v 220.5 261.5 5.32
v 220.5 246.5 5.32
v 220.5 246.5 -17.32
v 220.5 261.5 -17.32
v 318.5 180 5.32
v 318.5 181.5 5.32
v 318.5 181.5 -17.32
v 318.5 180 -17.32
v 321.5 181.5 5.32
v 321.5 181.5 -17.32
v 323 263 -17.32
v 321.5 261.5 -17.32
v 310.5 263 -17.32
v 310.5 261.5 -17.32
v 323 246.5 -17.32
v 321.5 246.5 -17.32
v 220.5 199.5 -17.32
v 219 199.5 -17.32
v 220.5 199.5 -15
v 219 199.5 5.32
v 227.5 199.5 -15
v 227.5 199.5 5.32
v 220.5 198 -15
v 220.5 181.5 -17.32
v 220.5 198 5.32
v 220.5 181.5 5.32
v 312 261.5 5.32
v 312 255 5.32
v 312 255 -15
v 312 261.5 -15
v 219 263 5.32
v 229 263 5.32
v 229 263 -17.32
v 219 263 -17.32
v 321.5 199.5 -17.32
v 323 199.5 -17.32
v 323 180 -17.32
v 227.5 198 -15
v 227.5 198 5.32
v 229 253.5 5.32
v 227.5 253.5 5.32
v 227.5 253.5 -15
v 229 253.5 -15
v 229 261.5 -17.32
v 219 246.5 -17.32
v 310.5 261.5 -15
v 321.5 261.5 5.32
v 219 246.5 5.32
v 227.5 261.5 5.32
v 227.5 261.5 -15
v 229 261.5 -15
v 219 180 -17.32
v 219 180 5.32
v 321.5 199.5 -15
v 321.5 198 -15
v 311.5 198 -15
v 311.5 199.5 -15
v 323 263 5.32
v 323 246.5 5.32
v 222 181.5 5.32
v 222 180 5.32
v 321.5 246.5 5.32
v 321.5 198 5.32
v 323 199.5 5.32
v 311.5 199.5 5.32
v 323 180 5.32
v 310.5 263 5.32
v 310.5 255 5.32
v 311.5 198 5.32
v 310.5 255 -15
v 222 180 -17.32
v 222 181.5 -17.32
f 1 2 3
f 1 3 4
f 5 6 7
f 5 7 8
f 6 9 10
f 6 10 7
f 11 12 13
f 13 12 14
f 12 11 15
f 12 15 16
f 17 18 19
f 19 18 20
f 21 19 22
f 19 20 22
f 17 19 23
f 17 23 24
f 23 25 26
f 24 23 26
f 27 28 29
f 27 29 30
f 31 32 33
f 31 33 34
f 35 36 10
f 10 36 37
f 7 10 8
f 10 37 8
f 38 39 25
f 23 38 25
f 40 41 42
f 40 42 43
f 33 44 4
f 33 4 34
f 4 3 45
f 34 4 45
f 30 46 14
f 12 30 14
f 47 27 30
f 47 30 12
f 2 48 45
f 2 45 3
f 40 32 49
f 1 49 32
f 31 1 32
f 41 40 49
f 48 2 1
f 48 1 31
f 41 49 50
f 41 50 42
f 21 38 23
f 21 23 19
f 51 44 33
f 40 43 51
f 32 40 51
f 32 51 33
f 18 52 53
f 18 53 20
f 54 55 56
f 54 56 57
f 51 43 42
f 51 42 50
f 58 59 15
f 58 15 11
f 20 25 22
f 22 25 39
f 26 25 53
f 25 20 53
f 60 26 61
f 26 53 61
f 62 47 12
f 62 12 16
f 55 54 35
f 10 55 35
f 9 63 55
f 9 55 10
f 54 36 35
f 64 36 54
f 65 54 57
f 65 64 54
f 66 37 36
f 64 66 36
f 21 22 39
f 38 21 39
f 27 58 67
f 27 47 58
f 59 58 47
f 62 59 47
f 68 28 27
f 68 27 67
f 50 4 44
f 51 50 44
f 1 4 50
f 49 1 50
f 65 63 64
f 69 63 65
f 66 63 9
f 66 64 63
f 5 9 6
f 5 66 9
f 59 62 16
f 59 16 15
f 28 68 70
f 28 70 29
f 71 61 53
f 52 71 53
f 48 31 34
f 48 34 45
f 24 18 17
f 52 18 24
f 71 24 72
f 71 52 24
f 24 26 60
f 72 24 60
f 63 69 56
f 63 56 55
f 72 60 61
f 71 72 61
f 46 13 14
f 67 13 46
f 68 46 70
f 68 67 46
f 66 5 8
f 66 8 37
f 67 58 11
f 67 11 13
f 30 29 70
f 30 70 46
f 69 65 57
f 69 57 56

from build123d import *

# Parameters (mm, degrees)
SKETCH068_W      = 80
SKETCH068_H      = 3
EXTRUDE058_DEPTH = 101
EXTRUDE057_DEPTH = 22.64


with BuildPart() as extrude058:
    # Sketch068 → Extrude058 (new body)
    with BuildSketch(Plane.YZ.offset(321.5)):
        with Locations((221.5, -16.5)):
            Rectangle(SKETCH068_W, SKETCH068_H)
    extrude(amount=-EXTRUDE058_DEPTH)


with BuildPart() as jetson_align001:
    # Sketch067 → Extrude057 (new body)
    with BuildSketch(Plane(origin=(0, 0, 5.32), x_dir=(1, 0, 0), z_dir=(0, 0, -1))):
        Polygon((321.5, -246.5), (323, -246.5), (323, -263), (310.5, -263), (310.5, -255), (312, -255), (312, -261.5), (321.5, -261.5), align=None)
        Polygon((220.5, -246.5), (220.5, -261.5), (227.5, -261.5), (227.5, -253.5), (229, -253.5), (229, -263), (219, -263), (219, -246.5), align=None)
        Polygon((227.5, -199.5), (227.5, -198), (220.5, -198), (220.5, -181.5), (222, -181.5), (222, -180), (219, -180), (219, -199.5), align=None)
        Polygon((311.5, -199.5), (311.5, -198), (321.5, -198), (321.5, -181.5), (318.5, -181.5), (318.5, -180), (323, -180), (323, -199.5), align=None)
    extrude(amount=EXTRUDE057_DEPTH)

    # Cut005: cut Extrude058
    add(extrude058.part, mode=Mode.SUBTRACT)


solid = jetson_align001.part
